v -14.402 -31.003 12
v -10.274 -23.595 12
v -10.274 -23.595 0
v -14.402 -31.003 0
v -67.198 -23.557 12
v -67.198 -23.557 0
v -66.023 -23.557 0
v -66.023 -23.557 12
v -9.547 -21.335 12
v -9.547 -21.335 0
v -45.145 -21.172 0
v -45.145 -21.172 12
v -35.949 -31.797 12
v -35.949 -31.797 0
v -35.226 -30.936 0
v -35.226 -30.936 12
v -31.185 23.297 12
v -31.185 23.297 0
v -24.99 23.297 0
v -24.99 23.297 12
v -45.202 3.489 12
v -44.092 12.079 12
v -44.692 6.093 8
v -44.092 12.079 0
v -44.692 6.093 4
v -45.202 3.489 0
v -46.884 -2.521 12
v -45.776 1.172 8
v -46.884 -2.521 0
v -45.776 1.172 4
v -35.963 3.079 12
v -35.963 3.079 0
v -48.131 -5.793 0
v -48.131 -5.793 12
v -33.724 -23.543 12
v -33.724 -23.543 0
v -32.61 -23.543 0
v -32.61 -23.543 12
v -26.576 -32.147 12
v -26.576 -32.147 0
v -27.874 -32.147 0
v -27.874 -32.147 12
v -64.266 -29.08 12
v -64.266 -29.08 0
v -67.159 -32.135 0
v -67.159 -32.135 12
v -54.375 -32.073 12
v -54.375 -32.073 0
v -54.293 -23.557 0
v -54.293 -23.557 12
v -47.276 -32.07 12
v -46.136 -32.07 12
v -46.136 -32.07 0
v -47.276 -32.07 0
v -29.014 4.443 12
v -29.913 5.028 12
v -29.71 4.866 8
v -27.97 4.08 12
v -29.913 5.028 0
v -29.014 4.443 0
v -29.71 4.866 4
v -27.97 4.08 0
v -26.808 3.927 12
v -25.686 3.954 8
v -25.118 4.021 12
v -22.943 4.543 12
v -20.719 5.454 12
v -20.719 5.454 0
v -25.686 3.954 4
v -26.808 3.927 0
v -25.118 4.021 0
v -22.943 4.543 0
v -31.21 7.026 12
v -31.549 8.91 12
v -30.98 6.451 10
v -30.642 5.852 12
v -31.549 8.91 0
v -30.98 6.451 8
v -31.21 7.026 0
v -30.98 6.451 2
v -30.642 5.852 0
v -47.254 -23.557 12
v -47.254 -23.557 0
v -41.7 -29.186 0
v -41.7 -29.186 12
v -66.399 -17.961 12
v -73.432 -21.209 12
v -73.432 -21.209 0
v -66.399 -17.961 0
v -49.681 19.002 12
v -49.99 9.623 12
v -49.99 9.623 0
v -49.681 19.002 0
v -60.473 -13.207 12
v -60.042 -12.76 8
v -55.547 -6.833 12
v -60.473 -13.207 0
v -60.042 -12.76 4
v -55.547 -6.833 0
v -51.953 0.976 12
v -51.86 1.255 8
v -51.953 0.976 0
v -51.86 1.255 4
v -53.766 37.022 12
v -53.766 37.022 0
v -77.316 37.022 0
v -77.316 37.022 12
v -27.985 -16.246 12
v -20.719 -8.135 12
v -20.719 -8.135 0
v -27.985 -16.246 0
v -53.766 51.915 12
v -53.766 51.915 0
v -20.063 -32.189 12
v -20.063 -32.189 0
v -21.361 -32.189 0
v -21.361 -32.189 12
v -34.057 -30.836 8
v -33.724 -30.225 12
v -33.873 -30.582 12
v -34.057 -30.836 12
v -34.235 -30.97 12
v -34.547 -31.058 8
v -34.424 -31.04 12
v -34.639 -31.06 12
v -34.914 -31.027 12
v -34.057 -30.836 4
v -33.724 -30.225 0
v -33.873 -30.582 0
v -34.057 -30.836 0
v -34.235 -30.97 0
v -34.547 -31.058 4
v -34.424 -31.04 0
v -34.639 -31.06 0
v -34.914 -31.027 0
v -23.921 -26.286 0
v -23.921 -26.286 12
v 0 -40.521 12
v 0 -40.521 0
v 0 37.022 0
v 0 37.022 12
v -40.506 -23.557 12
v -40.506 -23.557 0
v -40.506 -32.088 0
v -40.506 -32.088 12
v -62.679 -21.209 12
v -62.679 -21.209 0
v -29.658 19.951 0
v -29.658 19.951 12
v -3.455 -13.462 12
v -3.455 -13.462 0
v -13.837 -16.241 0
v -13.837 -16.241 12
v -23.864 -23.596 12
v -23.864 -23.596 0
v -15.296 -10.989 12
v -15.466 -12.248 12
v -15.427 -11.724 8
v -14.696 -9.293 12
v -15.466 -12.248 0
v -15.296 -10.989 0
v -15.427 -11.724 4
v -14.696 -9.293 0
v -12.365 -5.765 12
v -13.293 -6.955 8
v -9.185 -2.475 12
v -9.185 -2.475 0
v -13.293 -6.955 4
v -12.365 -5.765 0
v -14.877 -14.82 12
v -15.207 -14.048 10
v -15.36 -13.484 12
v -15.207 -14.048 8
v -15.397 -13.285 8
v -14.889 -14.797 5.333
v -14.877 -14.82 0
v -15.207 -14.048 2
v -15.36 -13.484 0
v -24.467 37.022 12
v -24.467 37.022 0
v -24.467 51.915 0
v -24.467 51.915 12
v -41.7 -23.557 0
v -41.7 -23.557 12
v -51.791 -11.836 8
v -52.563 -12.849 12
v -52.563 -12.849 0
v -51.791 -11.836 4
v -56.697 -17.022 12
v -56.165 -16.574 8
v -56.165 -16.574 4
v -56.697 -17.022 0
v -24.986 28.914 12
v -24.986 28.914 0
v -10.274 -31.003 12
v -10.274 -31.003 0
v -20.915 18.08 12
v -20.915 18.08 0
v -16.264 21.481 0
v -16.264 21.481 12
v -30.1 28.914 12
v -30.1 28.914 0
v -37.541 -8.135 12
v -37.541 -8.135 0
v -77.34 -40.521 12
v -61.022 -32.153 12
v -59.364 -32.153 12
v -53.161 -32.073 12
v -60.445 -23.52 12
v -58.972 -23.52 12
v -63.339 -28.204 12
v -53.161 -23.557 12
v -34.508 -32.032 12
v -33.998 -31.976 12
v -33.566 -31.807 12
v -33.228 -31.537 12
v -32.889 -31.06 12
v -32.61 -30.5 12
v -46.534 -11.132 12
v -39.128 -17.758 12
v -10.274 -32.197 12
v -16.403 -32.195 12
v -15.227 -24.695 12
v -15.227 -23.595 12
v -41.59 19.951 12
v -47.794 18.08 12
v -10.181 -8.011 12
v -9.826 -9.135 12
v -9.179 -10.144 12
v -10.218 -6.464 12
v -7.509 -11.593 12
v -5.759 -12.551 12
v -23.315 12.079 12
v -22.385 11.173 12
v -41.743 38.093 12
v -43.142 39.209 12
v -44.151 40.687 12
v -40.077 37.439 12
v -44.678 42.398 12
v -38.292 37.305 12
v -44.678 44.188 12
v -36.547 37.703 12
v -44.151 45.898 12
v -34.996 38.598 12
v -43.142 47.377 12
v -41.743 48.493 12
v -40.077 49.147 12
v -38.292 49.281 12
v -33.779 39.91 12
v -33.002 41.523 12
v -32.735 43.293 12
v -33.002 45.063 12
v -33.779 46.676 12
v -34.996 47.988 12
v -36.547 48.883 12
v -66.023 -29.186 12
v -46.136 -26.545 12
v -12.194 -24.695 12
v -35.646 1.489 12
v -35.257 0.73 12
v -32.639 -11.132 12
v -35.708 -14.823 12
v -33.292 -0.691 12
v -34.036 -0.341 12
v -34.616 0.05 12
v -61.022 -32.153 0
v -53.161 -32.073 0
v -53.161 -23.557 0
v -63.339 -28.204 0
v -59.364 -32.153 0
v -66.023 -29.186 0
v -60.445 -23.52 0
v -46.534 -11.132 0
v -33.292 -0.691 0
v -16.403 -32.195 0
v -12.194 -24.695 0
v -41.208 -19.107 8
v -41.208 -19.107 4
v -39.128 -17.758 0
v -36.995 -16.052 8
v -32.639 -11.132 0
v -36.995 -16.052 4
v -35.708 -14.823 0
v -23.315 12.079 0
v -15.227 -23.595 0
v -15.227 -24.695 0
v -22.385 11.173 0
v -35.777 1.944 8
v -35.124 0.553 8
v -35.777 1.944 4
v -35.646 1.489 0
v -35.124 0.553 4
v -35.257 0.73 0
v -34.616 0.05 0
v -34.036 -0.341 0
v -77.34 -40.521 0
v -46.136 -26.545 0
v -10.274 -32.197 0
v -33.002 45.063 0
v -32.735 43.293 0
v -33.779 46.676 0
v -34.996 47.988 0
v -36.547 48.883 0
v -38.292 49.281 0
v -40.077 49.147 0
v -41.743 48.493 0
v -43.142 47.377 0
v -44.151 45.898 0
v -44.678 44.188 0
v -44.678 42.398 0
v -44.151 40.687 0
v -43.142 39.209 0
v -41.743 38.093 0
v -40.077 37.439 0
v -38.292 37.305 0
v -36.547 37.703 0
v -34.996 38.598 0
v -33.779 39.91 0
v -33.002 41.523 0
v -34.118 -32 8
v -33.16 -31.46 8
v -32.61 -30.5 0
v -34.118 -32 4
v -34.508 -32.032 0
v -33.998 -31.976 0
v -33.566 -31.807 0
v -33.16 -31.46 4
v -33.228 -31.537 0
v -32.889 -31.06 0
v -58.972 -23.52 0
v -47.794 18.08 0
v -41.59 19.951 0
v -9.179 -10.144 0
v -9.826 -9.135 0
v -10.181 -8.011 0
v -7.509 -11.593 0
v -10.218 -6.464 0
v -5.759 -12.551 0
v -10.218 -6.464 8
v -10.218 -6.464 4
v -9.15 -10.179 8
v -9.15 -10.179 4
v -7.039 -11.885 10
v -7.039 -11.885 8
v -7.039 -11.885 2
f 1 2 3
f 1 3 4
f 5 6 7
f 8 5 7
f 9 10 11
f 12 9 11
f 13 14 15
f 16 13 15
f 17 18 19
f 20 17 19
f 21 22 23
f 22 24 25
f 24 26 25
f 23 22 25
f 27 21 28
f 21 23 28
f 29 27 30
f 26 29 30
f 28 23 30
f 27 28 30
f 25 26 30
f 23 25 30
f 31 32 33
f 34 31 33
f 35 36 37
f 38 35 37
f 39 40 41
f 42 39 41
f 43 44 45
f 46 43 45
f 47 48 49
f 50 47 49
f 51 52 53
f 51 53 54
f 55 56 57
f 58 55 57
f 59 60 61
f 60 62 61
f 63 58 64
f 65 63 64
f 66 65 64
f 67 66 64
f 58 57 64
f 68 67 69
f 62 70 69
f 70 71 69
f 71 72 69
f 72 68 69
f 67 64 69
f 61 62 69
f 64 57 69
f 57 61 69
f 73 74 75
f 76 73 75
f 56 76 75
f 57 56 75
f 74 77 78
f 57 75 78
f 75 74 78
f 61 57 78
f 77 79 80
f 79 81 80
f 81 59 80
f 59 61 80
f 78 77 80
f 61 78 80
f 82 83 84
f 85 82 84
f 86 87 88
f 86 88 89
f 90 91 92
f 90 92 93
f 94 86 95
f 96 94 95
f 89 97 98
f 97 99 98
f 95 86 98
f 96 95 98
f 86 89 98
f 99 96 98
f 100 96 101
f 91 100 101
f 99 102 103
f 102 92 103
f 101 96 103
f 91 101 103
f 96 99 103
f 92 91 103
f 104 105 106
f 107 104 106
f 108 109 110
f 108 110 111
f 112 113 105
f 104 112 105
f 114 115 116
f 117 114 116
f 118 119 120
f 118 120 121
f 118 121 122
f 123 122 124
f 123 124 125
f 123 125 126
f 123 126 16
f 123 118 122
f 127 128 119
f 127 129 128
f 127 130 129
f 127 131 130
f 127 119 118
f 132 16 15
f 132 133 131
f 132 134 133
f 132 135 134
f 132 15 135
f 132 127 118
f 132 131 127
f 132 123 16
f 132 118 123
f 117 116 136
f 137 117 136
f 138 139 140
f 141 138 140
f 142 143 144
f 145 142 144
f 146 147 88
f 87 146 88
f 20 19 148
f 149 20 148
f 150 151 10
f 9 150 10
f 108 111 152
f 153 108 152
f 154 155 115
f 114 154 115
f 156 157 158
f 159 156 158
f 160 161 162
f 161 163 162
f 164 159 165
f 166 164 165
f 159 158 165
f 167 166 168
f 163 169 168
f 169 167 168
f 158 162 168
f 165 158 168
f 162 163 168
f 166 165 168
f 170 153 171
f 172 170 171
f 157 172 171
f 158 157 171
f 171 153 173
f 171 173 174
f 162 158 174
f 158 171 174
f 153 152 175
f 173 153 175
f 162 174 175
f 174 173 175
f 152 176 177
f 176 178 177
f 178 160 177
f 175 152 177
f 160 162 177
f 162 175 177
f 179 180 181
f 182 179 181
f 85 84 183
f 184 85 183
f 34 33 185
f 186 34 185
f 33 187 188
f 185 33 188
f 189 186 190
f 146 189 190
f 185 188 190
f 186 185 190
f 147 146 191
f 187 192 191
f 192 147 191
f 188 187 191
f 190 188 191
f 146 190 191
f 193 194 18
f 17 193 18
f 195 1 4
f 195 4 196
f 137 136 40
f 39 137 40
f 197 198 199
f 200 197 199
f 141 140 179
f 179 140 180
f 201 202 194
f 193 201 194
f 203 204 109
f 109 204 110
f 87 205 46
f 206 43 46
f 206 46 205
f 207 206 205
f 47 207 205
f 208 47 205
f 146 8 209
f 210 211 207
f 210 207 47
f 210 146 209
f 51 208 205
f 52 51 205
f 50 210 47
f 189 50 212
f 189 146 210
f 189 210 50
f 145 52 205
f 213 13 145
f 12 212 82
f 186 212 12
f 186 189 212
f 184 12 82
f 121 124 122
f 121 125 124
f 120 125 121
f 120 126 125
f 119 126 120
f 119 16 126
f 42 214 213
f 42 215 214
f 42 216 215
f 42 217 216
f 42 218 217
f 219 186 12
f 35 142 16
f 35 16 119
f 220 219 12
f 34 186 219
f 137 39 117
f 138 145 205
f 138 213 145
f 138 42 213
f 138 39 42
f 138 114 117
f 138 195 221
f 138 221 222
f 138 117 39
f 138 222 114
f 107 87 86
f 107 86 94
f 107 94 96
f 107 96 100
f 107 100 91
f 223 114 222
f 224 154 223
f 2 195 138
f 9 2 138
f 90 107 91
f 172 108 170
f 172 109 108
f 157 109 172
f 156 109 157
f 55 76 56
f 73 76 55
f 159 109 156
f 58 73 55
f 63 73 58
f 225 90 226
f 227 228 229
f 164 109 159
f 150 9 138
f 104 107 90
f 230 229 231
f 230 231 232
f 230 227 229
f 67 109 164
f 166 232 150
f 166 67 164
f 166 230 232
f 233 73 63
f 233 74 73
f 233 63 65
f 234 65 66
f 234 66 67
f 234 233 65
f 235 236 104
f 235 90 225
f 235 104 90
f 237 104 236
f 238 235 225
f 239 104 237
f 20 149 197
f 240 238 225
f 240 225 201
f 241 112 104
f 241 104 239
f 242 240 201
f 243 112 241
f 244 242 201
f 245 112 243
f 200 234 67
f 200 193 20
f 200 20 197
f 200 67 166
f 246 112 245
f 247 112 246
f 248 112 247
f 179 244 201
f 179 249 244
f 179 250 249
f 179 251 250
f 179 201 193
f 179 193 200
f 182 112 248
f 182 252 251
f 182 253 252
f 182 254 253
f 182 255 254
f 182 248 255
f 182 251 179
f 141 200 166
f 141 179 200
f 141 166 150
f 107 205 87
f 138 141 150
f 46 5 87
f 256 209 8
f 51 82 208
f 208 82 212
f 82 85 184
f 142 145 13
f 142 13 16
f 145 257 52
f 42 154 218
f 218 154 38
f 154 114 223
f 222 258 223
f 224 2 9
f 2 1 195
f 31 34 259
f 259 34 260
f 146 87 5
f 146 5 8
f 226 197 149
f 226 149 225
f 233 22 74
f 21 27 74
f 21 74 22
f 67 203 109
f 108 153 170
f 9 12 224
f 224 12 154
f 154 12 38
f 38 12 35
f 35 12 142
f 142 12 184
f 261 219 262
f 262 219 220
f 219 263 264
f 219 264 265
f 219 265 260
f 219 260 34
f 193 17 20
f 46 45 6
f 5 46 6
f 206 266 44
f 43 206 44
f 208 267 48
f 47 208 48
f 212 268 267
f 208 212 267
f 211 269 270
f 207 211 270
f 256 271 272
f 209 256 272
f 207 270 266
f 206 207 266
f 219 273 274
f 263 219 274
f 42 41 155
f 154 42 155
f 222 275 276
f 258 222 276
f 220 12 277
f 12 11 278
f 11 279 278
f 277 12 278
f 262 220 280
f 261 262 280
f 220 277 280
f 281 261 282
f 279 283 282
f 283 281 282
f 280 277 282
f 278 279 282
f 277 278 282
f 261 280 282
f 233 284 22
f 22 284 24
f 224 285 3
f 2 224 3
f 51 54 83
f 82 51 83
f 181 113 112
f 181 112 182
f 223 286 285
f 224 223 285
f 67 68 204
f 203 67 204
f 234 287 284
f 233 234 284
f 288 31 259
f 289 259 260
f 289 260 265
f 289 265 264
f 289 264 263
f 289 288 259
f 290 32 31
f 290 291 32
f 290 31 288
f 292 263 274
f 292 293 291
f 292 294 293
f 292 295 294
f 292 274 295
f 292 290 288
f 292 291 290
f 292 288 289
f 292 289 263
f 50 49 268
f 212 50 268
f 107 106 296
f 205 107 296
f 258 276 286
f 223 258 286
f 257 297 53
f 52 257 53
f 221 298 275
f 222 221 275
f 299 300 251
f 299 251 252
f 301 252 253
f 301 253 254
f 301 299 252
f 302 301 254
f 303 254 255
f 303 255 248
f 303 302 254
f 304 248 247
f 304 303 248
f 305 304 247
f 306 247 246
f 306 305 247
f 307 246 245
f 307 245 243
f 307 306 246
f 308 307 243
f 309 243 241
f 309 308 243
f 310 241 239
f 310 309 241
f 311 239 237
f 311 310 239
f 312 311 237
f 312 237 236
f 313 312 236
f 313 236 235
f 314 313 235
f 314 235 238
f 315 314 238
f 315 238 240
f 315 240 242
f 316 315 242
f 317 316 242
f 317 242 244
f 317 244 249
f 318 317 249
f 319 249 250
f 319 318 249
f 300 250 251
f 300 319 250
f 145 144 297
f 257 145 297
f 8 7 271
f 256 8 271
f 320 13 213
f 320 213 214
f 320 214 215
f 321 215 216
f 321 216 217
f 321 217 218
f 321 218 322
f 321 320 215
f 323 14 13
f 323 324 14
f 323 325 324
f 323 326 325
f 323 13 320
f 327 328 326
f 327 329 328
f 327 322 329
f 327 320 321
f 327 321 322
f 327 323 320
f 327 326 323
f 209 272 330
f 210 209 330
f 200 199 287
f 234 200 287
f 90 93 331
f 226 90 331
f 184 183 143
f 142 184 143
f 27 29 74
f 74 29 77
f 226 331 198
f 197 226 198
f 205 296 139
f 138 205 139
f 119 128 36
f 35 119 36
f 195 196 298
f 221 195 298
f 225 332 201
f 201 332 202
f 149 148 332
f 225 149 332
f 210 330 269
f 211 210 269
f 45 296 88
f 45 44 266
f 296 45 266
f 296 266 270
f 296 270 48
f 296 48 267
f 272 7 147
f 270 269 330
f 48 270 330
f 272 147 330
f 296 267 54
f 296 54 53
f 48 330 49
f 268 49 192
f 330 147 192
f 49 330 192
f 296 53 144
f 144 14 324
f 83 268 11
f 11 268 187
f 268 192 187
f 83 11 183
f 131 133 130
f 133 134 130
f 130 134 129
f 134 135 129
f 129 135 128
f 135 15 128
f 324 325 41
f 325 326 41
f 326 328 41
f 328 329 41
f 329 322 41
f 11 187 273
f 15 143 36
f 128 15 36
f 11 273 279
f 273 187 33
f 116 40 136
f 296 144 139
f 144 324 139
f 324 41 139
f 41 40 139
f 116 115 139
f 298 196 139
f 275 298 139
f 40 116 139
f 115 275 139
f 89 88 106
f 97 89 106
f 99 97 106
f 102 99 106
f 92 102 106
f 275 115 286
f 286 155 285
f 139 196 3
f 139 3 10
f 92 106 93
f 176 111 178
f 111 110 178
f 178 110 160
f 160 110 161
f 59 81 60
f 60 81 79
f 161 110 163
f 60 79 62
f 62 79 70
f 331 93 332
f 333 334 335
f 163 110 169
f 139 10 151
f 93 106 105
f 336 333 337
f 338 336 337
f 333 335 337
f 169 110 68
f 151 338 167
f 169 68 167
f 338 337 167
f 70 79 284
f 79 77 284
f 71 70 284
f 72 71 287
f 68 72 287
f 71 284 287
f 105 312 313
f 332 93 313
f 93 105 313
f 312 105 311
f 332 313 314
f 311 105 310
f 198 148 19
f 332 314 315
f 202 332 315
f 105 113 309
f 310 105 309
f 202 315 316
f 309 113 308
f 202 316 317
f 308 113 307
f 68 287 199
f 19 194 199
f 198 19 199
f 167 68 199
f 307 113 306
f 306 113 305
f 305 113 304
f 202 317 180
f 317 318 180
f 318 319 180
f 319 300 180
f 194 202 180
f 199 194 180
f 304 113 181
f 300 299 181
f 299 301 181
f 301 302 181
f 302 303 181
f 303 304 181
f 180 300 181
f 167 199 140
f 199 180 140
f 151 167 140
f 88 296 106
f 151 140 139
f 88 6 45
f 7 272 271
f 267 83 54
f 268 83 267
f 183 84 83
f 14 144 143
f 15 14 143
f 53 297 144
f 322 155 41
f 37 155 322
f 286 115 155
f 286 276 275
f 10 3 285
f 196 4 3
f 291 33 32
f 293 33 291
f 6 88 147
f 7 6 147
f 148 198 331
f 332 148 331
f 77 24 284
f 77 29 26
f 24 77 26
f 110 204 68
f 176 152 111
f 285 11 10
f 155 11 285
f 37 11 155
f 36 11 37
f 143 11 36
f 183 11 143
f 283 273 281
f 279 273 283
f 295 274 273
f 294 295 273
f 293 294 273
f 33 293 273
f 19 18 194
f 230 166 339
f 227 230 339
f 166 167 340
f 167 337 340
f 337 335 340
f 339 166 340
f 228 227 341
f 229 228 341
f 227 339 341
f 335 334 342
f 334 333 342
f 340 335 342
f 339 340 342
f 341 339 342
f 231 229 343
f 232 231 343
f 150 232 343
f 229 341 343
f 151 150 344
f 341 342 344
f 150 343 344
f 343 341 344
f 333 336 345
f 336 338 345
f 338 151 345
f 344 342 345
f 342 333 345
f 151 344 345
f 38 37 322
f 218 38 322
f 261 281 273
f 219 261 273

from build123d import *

# Parameters (mm, degrees)
F0_W     = 29.2992349714
F0_H     = 14.8931406438
F0_R     = 6.0048631412
F0_H_2   = 4.8183426261
F1_DEPTH = 12


with BuildPart() as f1:
    # F0 (on Top) → F1 (new body)
    with BuildSketch(Plane.XY):
        with Locations((-39.1167411581, 44.4685835391)):
            Rectangle(F0_W, F0_H)
        with Locations((-38.7403294444, 43.2928875089)):
            Circle(F0_R, mode=Mode.SUBTRACT)
        with Locations((-39.1167411581, 34.6128419042)):
            Rectangle(F0_W, F0_H_2)
        Polygon((-53.7663586438, 37.0220132172), (-77.3156434298, 37.0220132172), (-77.3395821452, -40.5214428902), (0, -40.5214428902), (0, 37.0220132172), (-24.4671236724, 37.0220132172), (-24.4671236724, 32.2036705911), (-53.7663586438, 32.2036705911), align=None)
        Polygon((-67.159412581, -32.1348457524), (-67.1982951041, -23.5573574901), (-66.0232231021, -23.5573574901), (-66.0232231021, -29.1860792786), (-60.445215553, -23.52036722), (-58.9717775583, -23.52036722), (-63.3394643664, -28.2037891448), (-59.3640394509, -32.1531780064), (-61.0216520727, -32.1531780064), (-64.2655640841, -29.080113396), align=None, mode=Mode.SUBTRACT)
        Polygon((-54.3745607138, -32.0733748376), (-54.2933704932, -23.5573574901), (-53.1613752246, -23.5573574901), (-53.1613752246, -32.0733748376), align=None, mode=Mode.SUBTRACT)
        Polygon((-46.1362972856, -32.0704504848), (-47.276455909, -32.0704504848), (-47.2535975277, -23.5573574901), (-41.6997484863, -29.1860792786), (-41.6997484863, -23.5573574901), (-40.5064902602, -23.5573574901), (-40.5064902602, -32.0877228451), (-46.1362972856, -26.5450645238), align=None, mode=Mode.SUBTRACT)
        with BuildLine():
            add(Edge.make_bspline(
                [(-35.9488576651, -31.7970253527), (-33.5259176791, -32.4797704816), (-33.1114083529, -31.5621960908), (-32.6099060476, -30.5001884699)],
                knots=[0, 0, 0, 0, 3.5819525129, 3.5819525129, 3.5819525129, 3.5819525129], degree=3))
            Line((-35.9488576651, -31.7970253527), (-35.2263972163, -30.936172232))
            add(Edge.make_bspline(
                [(-33.7235666811, -30.2251502872), (-33.989623189, -31.0443080962), (-34.4412997365, -31.2153324485), (-35.2263972163, -30.936172232)],
                knots=[0, 0, 0, 0, 1.6625437809, 1.6625437809, 1.6625437809, 1.6625437809], degree=3))
            Line((-33.7235666811, -30.2251502872), (-33.7235666811, -23.5433634371))
            Line((-33.7235666811, -23.5433634371), (-32.6099060476, -23.5433634371))
            Line((-32.6099060476, -23.5433634371), (-32.6099060476, -30.5001884699))
        make_face(mode=Mode.SUBTRACT)
        Polygon((-26.5759304166, -32.1469455957), (-27.8739575297, -32.1469455957), (-23.8643418998, -23.5957931727), (-20.0629122555, -32.1894772351), (-21.3611982763, -32.1894772351), (-23.9209700376, -26.2861810625), align=None, mode=Mode.SUBTRACT)
        Polygon((-10.2736325935, -31.0030188411), (-10.2736325935, -32.1972407401), (-16.4032950997, -32.1946702898), (-12.1941762045, -24.6954783797), (-15.2269415557, -24.6954783797), (-15.2269415557, -23.5953740776), (-10.2736325935, -23.5953740776), (-14.4022190943, -31.0030188411), align=None, mode=Mode.SUBTRACT)
        with BuildLine():
            add(Edge.make_bspline(
                [(-48.1313951313, -5.793298129), (-51.9084185362, -12.8880571574), (-54.6201877296, -16.2256192416), (-62.6786500216, -21.2091294951)],
                knots=[0, 0, 0, 0, 21.1960015463, 21.1960015463, 21.1960015463, 21.1960015463], degree=3))
            Line((-62.6786500216, -21.2091294951), (-73.4323149167, -21.2091294951))
            add(Edge.make_bspline(
                [(-73.4323149167, -21.2091294951), (-57.703204453, -16.1548238248), (-48.5936999321, 0), (-49.6808459371, 19.0024100635)],
                knots=[0, 0, 0, 0, 46.7022503994, 46.7022503994, 46.7022503994, 46.7022503994], degree=3))
            Line((-49.6808459371, 19.0024100635), (-47.7940440178, 18.0804803967))
            Line((-47.7940440178, 18.0804803967), (-20.9154095501, 18.0804803967))
            Line((-20.9154095501, 18.0804803967), (-16.2641759962, 21.4805174619))
            Line((-16.2641759962, 21.4805174619), (-22.3851986229, 11.1733824015))
            Line((-22.3851986229, 11.1733824015), (-23.3154464513, 12.0788225904))
            Line((-23.3154464513, 12.0788225904), (-44.0920963883, 12.0788225904))
            add(Edge.make_bspline(
                [(-44.0920963883, 12.0788225904), (-44.2973412573, 5.6142648682), (-45.9161922336, 0.504262629), (-46.8841008842, -2.5212171022)],
                knots=[0, 0, 0, 0, 14.8646038673, 14.8646038673, 14.8646038673, 14.8646038673], degree=3))
            Line((-46.8841008842, -2.5212171022), (-31.5485745668, 8.9099174365))
            add(Edge.make_bspline(
                [(-31.5485745668, 8.9099174365), (-31.2168560922, 3.058941802), (-25.7437750697, 2.9881331138), (-20.7194462419, 5.4543670267)],
                knots=[0, 0, 0, 0, 11.3670950077, 11.3670950077, 11.3670950077, 11.3670950077], degree=3))
            Line((-20.7194462419, 5.4543670267), (-37.5409174588, -8.1352172419))
            Line((-37.5409174588, -8.1352172419), (-20.7194462419, -8.1352172419))
            Line((-20.7194462419, -8.1352172419), (-27.9845260084, -16.2464901805))
            Line((-27.9845260084, -16.2464901805), (-13.8373728842, -16.2410978228))
            add(Edge.make_bspline(
                [(-13.8373728842, -16.2410978228), (-17.871780321, -12.0312822983), (-13.6970458552, -6.6286842339), (-9.1847963631, -2.4753166363)],
                knots=[0, 0, 0, 0, 14.5307673562, 14.5307673562, 14.5307673562, 14.5307673562], degree=3))
            add(Edge.make_bspline(
                [(-9.1847963631, -2.4753166363), (-10.4274889454, -6.5475832671), (-12.3048676178, -10.4483598843), (-3.4550998826, -13.4620796889)],
                knots=[0, 0, 0, 0, 12.3910606541, 12.3910606541, 12.3910606541, 12.3910606541], degree=3))
            Line((-3.4550998826, -13.4620796889), (-9.5468144864, -21.3348828256))
            Line((-9.5468144864, -21.3348828256), (-45.1452918351, -21.172452718))
            add(Edge.make_bspline(
                [(-45.1452918351, -21.172452718), (-41.3889959455, -19.3084012717), (-37.0229622611, -17.2780938447), (-32.638940055, -11.1317606643)],
                knots=[0, 0, 0, 0, 16.0382147312, 16.0382147312, 16.0382147312, 16.0382147312], degree=3))
            Line((-32.638940055, -11.1317606643), (-46.5337000787, -11.1317606643))
            Line((-46.5337000787, -11.1317606643), (-33.2919247448, -0.691383786))
            add(Edge.make_bspline(
                [(-35.9633229673, 3.0791759491), (-35.7742495835, 2.2057159804), (-35.9496586025, 0.3463805187), (-33.2919247448, -0.691383786)],
                knots=[0, 0, 0, 0, 4.6209835727, 4.6209835727, 4.6209835727, 4.6209835727], degree=3))
            Line((-35.9633229673, 3.0791759491), (-48.1313951313, -5.793298129))
        make_face(mode=Mode.SUBTRACT)
        Polygon((-29.6582430601, 19.9509840459), (-41.5902063251, 19.9509840459), (-30.0995688885, 28.9142616093), (-24.986051023, 28.9142616093), (-31.1850644648, 23.2966467738), (-24.989714846, 23.2966467738), align=None, mode=Mode.SUBTRACT)
    extrude(amount=F1_DEPTH)


solid = f1.part
